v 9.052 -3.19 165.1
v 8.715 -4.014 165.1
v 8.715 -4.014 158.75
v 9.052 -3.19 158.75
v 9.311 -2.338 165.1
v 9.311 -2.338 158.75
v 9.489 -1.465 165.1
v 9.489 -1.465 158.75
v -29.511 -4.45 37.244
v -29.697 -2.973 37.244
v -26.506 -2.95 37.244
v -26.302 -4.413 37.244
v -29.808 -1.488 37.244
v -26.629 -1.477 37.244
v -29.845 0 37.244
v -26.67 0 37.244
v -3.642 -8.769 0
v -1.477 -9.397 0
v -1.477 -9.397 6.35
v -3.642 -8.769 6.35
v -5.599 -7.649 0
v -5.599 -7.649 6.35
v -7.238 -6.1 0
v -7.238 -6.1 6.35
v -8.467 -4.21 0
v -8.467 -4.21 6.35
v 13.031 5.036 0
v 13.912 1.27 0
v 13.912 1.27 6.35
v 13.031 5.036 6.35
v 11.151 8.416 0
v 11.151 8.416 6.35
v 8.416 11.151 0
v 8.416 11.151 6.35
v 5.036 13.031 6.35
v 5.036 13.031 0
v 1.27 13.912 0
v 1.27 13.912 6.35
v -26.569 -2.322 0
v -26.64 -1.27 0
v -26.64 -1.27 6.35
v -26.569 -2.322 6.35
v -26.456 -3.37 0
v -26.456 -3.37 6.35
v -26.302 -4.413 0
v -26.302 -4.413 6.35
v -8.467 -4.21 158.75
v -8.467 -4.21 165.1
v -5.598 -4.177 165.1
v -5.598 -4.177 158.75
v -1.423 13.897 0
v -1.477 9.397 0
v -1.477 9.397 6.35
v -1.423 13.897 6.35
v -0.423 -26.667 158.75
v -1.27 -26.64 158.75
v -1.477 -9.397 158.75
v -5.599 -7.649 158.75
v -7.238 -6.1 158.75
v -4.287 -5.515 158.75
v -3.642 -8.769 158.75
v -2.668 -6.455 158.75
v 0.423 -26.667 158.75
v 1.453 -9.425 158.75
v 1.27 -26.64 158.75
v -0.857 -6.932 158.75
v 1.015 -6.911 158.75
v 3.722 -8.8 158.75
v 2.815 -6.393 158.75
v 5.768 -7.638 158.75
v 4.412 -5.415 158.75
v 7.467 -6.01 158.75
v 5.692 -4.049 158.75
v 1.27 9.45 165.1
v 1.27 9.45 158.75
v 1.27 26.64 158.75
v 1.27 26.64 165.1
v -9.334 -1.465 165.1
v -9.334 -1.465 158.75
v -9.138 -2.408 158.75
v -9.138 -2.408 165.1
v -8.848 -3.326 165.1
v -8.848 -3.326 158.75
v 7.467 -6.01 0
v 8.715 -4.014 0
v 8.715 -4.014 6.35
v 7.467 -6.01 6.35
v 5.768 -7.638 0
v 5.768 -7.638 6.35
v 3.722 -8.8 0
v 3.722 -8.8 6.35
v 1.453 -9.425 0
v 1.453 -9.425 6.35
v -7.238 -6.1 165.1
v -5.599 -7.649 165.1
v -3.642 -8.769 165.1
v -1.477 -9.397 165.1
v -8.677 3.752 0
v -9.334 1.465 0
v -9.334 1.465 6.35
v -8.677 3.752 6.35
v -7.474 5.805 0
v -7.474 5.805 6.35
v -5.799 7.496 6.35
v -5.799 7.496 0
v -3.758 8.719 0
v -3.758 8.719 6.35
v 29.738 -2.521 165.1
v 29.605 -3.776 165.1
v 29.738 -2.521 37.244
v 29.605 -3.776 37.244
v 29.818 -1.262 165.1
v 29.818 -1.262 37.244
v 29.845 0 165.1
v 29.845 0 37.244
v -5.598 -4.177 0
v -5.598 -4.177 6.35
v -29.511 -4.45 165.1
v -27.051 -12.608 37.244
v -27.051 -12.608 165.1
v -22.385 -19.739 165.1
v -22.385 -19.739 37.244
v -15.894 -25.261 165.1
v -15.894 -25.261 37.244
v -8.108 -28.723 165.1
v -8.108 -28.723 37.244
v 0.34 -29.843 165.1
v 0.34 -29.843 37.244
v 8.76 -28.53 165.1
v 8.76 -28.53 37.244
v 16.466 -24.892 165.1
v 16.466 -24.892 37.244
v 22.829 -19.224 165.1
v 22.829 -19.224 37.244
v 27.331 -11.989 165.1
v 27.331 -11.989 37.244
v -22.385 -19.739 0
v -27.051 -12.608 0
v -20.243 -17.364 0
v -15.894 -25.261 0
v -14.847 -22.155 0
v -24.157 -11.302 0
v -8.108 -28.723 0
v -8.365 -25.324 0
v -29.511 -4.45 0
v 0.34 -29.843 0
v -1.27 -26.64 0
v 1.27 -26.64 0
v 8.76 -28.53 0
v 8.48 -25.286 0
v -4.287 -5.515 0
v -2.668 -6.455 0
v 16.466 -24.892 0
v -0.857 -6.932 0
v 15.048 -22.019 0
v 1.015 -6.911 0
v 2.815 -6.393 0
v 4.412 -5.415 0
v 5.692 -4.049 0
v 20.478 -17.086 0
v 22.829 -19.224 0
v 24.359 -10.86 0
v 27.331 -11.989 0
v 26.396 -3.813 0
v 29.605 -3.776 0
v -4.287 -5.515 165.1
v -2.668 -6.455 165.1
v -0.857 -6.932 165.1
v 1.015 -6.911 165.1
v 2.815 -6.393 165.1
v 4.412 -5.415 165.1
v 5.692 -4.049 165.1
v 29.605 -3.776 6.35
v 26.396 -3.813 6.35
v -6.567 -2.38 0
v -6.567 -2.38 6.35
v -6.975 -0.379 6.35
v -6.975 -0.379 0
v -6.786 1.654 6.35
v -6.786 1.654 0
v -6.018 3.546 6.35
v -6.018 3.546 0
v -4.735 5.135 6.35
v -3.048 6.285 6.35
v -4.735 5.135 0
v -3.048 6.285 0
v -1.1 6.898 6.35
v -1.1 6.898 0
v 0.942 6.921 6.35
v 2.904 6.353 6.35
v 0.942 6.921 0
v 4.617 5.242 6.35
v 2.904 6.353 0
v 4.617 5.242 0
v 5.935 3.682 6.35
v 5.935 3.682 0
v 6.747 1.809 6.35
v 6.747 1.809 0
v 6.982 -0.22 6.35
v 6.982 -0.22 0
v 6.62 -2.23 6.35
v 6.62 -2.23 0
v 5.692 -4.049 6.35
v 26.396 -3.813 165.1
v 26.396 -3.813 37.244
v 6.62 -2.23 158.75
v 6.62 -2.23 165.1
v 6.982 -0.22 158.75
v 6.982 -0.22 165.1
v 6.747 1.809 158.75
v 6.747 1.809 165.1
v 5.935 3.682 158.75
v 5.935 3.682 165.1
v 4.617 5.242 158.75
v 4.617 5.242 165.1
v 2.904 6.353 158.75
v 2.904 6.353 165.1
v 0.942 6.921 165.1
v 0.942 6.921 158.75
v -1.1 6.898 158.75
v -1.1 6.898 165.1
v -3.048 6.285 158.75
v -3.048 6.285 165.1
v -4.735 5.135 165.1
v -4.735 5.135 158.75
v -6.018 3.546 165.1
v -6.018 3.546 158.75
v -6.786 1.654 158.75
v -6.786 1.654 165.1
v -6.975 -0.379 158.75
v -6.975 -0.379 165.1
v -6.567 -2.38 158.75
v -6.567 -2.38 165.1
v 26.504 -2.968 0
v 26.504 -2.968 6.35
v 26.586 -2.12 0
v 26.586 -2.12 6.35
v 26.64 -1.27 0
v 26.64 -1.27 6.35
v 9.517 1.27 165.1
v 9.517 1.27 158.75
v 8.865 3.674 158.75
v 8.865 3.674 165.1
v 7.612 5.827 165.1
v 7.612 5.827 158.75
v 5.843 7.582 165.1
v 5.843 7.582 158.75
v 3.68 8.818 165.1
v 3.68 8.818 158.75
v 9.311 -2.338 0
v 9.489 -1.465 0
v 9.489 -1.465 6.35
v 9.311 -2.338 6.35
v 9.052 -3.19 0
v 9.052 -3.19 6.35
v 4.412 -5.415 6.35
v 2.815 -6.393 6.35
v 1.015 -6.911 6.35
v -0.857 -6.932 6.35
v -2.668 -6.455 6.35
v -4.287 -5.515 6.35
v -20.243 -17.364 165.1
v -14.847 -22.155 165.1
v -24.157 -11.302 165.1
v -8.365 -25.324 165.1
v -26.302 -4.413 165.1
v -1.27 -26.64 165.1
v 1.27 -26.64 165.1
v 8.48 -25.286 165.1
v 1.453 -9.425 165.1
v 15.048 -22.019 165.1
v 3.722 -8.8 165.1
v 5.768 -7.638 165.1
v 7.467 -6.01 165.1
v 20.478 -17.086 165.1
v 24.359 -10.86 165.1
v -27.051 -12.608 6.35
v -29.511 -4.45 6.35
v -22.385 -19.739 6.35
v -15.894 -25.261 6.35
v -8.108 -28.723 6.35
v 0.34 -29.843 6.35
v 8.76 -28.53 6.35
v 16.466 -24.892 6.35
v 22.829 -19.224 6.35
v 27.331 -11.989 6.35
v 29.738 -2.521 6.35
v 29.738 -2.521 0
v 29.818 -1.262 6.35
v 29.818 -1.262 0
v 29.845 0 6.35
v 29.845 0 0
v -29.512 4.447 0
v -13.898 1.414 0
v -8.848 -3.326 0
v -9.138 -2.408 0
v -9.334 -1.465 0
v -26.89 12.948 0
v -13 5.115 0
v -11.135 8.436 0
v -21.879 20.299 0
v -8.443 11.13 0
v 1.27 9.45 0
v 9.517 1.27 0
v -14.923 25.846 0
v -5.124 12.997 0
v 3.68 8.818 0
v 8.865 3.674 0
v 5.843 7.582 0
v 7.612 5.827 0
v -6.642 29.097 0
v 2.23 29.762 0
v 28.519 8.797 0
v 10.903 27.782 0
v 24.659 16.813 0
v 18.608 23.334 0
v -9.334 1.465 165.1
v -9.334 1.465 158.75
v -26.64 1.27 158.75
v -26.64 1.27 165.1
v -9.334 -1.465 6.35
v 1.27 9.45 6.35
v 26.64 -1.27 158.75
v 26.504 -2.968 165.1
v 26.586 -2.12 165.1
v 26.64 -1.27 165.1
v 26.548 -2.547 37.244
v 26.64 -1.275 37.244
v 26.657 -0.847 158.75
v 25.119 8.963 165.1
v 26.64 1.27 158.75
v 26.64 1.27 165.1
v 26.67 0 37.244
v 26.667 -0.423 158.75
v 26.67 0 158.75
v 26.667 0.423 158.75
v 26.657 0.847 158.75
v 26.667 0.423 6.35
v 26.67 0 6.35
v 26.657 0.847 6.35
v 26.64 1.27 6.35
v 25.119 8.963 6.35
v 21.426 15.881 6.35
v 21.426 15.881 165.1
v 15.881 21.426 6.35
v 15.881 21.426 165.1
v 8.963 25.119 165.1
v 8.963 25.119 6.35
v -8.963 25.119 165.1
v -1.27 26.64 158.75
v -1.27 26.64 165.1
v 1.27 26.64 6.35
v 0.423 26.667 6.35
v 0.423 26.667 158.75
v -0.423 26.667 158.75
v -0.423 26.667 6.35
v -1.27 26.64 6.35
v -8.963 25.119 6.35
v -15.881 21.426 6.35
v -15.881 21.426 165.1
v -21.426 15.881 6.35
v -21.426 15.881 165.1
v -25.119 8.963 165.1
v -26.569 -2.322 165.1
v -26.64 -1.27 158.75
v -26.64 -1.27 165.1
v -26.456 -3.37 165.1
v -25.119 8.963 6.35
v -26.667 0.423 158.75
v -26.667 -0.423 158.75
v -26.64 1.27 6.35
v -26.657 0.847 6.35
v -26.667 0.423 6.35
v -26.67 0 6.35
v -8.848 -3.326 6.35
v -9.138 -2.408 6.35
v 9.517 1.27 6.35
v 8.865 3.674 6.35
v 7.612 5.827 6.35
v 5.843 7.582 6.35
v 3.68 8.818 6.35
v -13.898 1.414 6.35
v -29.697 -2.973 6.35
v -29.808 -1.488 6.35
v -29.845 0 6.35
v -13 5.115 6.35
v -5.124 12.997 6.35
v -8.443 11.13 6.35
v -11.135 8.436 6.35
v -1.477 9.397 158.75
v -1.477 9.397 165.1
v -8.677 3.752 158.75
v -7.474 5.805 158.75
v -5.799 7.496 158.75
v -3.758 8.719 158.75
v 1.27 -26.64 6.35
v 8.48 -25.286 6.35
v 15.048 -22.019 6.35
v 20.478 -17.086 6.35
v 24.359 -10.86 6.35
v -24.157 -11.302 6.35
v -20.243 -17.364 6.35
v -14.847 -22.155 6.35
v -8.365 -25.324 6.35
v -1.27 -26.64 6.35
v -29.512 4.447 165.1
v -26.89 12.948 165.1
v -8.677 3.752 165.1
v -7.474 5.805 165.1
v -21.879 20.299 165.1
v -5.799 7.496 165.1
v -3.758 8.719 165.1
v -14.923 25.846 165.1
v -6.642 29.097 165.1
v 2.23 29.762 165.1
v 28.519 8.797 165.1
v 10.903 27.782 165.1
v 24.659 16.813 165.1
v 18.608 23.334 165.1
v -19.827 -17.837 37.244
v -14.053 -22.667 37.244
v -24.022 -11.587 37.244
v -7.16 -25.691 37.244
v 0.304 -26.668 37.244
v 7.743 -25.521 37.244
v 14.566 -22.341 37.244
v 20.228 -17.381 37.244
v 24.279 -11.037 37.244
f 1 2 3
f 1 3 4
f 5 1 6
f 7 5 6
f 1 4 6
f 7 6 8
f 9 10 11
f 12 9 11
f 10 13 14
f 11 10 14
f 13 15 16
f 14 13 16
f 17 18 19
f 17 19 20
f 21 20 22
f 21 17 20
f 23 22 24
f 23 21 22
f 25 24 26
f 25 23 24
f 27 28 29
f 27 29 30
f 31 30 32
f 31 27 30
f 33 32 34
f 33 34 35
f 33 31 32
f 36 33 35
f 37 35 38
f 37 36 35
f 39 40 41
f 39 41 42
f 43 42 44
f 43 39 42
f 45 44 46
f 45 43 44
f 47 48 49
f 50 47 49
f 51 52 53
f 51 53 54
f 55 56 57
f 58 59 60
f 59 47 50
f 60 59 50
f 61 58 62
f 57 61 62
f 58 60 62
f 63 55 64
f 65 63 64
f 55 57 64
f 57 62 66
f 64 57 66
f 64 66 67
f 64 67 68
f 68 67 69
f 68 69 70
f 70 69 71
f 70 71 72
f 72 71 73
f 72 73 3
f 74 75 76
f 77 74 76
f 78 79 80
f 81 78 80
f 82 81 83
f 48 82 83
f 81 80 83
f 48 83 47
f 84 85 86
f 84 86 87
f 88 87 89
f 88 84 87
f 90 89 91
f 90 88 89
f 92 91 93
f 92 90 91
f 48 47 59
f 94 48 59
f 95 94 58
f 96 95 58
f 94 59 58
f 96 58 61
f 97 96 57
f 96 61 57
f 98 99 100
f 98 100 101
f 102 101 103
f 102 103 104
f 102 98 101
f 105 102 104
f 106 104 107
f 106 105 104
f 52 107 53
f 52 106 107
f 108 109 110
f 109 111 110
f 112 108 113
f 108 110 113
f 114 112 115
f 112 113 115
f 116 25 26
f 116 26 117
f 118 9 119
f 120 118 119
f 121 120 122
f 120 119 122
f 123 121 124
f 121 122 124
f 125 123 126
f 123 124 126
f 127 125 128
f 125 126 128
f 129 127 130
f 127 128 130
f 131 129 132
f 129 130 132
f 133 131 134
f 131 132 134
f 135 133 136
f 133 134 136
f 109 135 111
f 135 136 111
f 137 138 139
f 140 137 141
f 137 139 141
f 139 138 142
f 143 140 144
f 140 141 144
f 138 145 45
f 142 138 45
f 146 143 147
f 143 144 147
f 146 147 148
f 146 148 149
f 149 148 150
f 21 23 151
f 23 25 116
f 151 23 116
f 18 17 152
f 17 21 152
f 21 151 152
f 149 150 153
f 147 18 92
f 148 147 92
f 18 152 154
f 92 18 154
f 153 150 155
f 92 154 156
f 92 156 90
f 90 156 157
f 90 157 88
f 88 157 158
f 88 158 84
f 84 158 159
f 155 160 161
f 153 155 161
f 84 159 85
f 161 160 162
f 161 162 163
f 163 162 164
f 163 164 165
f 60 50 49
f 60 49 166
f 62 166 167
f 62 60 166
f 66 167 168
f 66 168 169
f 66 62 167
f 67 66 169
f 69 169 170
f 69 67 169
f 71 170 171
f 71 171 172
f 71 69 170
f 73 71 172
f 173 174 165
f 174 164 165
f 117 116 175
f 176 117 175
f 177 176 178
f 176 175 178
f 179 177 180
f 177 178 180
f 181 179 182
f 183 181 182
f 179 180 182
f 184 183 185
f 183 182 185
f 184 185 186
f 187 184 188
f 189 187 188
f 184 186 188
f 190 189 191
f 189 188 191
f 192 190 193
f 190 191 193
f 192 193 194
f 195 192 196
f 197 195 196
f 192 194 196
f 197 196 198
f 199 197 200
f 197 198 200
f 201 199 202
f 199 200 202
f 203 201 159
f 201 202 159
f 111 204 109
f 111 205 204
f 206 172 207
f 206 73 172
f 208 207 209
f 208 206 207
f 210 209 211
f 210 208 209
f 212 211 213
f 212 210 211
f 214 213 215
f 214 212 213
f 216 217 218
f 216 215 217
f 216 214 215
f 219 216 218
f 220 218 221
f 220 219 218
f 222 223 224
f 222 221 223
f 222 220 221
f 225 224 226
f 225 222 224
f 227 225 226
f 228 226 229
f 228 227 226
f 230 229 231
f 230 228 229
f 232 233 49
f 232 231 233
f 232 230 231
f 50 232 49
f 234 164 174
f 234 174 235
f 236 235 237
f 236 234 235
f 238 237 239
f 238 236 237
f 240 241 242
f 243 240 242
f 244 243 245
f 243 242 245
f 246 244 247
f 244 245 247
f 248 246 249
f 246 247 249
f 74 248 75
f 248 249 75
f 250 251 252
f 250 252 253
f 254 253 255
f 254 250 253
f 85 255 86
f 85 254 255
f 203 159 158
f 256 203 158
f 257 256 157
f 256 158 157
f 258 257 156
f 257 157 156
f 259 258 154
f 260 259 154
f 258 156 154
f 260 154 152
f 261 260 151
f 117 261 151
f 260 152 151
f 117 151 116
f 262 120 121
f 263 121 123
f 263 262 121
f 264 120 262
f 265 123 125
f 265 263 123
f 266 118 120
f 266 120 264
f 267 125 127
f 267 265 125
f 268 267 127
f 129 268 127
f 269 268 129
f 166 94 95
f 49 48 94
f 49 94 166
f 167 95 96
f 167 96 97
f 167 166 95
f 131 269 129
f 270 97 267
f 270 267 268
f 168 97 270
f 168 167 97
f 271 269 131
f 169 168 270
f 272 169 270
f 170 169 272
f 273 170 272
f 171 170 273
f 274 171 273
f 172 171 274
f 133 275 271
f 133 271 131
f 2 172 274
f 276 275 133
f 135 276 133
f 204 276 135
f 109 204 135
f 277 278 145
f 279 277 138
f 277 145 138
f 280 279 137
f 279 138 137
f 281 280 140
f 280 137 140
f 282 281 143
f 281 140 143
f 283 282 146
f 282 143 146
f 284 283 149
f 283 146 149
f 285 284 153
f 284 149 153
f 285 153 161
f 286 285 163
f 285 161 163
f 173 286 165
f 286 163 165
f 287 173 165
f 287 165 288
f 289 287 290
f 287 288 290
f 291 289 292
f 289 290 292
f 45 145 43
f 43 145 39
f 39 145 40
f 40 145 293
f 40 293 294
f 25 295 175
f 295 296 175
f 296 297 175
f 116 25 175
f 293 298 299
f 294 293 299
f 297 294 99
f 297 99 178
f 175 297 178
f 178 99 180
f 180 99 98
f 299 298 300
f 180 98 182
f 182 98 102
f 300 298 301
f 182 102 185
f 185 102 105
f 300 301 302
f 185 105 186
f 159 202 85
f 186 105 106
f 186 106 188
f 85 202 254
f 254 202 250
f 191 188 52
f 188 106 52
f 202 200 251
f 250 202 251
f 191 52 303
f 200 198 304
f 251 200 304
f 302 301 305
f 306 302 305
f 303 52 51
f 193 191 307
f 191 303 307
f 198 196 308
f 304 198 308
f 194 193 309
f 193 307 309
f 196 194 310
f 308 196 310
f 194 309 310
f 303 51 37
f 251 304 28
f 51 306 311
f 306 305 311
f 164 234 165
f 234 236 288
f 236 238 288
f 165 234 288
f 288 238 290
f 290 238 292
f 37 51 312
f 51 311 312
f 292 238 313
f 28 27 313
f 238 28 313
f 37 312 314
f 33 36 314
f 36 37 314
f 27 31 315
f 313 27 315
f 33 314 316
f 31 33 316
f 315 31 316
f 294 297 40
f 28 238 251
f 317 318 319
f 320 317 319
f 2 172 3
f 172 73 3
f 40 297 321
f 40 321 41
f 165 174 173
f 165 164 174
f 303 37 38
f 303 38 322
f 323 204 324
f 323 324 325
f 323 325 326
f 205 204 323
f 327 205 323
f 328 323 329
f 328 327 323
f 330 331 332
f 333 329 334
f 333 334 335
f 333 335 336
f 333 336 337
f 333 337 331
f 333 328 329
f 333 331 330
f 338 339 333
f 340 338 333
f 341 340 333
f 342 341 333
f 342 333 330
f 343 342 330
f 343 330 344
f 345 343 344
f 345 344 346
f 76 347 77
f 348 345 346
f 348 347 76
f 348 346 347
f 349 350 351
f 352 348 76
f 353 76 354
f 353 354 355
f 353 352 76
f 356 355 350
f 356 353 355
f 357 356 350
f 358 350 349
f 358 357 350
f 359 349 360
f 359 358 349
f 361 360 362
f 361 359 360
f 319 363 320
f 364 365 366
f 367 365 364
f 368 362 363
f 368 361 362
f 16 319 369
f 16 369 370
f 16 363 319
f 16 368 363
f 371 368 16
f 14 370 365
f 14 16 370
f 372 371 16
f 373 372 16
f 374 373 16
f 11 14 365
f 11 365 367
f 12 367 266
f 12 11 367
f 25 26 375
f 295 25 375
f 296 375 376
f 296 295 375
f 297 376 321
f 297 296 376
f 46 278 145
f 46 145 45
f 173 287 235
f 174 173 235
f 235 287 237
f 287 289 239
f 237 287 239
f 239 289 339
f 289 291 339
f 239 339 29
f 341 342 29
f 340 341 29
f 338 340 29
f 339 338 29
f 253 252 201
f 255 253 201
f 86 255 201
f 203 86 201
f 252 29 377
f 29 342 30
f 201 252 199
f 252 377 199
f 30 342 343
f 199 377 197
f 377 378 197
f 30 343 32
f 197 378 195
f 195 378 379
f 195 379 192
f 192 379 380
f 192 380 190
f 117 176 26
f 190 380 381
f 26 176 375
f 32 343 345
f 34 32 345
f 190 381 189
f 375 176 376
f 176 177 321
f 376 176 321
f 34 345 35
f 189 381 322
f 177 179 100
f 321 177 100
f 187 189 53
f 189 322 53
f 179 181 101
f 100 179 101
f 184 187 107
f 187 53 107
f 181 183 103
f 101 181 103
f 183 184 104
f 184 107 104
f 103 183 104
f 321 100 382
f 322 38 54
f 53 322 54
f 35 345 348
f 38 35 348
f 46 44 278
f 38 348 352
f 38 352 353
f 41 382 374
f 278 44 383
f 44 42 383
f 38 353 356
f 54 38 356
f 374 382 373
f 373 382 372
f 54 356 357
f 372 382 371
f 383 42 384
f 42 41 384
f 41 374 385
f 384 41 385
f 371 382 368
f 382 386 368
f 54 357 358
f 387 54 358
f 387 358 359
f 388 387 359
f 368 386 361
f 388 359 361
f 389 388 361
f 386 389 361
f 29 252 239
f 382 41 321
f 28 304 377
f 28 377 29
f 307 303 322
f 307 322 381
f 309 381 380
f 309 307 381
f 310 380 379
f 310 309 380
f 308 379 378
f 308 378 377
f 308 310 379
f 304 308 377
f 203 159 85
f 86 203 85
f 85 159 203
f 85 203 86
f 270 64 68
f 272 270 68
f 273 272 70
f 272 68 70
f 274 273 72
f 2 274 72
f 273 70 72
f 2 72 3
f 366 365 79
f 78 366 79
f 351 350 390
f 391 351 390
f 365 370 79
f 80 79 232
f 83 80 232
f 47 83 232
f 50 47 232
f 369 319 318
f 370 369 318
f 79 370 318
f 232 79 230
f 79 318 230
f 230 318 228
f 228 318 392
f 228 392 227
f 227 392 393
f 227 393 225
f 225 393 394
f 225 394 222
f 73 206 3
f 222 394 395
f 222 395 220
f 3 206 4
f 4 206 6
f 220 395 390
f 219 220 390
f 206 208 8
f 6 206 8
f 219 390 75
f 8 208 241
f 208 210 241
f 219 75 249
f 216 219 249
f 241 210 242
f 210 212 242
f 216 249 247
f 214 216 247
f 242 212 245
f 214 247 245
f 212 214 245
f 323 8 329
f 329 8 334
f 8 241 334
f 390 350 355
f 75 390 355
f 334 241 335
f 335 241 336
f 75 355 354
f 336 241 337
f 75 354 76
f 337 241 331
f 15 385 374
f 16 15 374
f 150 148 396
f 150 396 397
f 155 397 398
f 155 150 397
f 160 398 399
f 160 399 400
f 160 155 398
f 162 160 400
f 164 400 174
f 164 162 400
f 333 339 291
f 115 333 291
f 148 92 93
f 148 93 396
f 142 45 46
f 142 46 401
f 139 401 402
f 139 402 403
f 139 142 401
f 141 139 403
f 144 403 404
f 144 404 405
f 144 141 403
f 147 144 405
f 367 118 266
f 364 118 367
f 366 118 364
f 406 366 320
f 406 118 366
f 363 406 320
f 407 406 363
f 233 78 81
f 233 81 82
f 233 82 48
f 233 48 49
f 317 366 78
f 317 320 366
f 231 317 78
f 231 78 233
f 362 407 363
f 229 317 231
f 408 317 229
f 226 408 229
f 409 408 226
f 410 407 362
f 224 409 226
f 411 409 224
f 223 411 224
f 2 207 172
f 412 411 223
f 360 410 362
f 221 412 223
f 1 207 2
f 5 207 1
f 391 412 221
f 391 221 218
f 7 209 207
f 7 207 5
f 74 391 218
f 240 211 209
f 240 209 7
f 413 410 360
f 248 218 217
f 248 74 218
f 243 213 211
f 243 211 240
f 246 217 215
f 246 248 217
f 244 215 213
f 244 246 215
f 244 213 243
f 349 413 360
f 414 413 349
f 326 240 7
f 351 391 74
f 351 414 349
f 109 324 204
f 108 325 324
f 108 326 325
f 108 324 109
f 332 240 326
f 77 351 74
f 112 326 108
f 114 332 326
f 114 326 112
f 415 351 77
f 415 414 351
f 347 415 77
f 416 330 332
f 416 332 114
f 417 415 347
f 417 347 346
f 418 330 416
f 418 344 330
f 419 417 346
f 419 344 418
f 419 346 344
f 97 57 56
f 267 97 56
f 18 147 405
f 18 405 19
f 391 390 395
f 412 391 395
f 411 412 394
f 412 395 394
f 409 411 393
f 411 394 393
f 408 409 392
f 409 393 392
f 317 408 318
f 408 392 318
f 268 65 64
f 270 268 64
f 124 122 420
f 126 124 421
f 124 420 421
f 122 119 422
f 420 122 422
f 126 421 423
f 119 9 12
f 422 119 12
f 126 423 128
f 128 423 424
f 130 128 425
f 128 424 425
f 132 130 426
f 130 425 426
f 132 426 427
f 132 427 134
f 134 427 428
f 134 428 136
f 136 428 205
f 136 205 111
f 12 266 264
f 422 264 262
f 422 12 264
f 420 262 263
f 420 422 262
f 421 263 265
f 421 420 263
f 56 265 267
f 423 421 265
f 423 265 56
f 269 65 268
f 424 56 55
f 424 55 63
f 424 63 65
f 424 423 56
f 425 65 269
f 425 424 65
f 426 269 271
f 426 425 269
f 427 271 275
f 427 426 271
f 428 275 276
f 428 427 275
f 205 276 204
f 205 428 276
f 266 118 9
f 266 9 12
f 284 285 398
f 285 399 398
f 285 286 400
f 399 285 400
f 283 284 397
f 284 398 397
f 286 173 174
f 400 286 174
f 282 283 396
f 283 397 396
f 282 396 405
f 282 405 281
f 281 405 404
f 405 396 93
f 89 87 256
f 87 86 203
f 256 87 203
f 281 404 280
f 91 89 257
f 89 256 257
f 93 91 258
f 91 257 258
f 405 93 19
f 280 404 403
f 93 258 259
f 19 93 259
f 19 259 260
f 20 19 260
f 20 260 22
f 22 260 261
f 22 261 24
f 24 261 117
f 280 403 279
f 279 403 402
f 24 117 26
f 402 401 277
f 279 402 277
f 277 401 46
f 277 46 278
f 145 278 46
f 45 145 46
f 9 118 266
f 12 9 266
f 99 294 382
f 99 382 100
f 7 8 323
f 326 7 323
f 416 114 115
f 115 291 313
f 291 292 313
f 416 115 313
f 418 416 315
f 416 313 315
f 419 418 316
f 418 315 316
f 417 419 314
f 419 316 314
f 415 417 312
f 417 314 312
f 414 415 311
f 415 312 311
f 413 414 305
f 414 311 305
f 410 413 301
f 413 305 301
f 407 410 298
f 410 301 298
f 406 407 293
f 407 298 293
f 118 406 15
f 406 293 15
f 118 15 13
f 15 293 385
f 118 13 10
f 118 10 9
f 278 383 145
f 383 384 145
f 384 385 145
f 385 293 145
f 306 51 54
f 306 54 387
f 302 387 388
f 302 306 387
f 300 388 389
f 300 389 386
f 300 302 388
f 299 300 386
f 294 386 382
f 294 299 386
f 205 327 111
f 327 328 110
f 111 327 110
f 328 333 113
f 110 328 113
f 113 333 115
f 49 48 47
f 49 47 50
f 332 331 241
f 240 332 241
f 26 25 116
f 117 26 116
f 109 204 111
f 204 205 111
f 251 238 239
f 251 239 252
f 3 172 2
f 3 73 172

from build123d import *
from build123d.topology import SkipClean

# Parameters (mm, degrees)
SKETCH1_R           = 29.845
SKETCH1_R_2         = 26.67
BOSS_EXTRUDE1_DEPTH = 165.1
SKETCH2_W           = 59.69
SKETCH2_H           = 38.1
CUT_EXTRUDE1_DEPTH  = 171.409677102
BOSS_EXTRUDE2_DEPTH = 6.35
SKETCH5_R           = 6.985
BOSS_EXTRUDE4_DEPTH = 6.35
BOSS_EXTRUDE5_START = -6.35
SKETCH4_R           = 29.845
SKETCH4_R_2         = 26.67
SKETCH4_R_3         = 6.985
BOSS_EXTRUDE5_DEPTH = 6.35


with BuildPart() as part:
    # Sketch1 → Boss-Extrude1 (new body)
    with BuildSketch(Plane.XY):
        Circle(SKETCH1_R)
        Circle(SKETCH1_R_2, mode=Mode.SUBTRACT)
    extrude(amount=BOSS_EXTRUDE1_DEPTH)

    # Sketch2 → Cut-Extrude1 (cut, through all)
    with BuildSketch(Plane(origin=(0, 0, 0), x_dir=(1, 0, 0), z_dir=(0, 1, 0))):
        with Locations((0, -18.194460122)):
            Rectangle(SKETCH2_W, SKETCH2_H)
    extrude(amount=-CUT_EXTRUDE1_DEPTH, mode=Mode.SUBTRACT)

    # Sketch3 → Boss-Extrude2 (add)
    with BuildSketch(Plane(origin=(0, 0, 0), x_dir=(-1, 0, 0), z_dir=(0, 0, -1))):
        with BuildLine():
            Line((-29.845, 0), (-13.97, 0))
            ThreePointArc((-13.97, 0), (0, 13.97), (13.97, 0))
            Line((13.97, 0), (29.845, 0))
            ThreePointArc((29.845, 0), (0, 29.845), (-29.845, 0))
        make_face()
    extrude(amount=-BOSS_EXTRUDE2_DEPTH)

    # Sketch5 → Boss-Extrude4 (add)
    # profile 1 of 2: a face of its own
    with SkipClean():  # the faces are left unmerged after this step: merging them gives an invalid solid
        with BuildSketch(Plane(origin=(0, 0, 0), x_dir=(-1, 0, 0), z_dir=(0, 0, -1))):
            with BuildLine():
                Line((26.639744744, 1.27), (13.898270164, 1.413855169))
                ThreePointArc((13.898270164, 1.413855169), (13.952056017, 0.707836776), (13.97, 0))
                Line((13.97, 0), (29.845, 0))
                ThreePointArc((29.845, 0), (0.635143844, 29.838240855), (-29.81796648, 1.27))
                ThreePointArc((-29.81796648, 1.27), (-29.838240855, 0.635143844), (-29.845, 0))
                Line((-29.845, 0), (-13.97, 0))
                ThreePointArc((-13.97, 0), (-13.955530747, 0.635658375), (-13.912152961, 1.27))
                Line((-13.912152961, 1.27), (-26.639744744, 1.27))
                ThreePointArc((-26.639744744, 1.27), (-18.858537854, 18.858537854), (-1.27, 26.639744744))
                Line((-1.27, 26.639744744), (-1.27, 13.912152961))
                ThreePointArc((-1.27, 13.912152961), (0.07695289, 13.969788053), (1.423189091, 13.897317468))
                Line((1.423189091, 13.897317468), (1.27, 26.639744744))
                ThreePointArc((1.27, 26.639744744), (18.858537854, 18.858537854), (26.639744744, 1.27))
            make_face()
        # profile 2 of 2: a face of its own
        with BuildSketch(Plane(origin=(0, 0, 0), x_dir=(-1, 0, 0), z_dir=(0, 0, -1))):
            with BuildLine():
                Line((13.898270164, 1.413855169), (9.33422749, 1.465384615))
                ThreePointArc((9.33422749, 1.465384615), (6.689709997, 6.703146826), (1.477288556, 9.397267918))
                Line((1.477288556, 9.397267918), (1.423189091, 13.897317468))
                ThreePointArc((1.423189091, 13.897317468), (0.07695289, 13.969788053), (-1.27, 13.912152961))
                Line((-1.27, 13.912152961), (-1.27, 9.45004085))
                ThreePointArc((-1.27, 9.45004085), (-6.784923303, 6.762723487), (-9.517329266, 1.27))
                Line((-9.517329266, 1.27), (-13.912152961, 1.27))
                ThreePointArc((-13.912152961, 1.27), (-13.955530747, 0.635658375), (-13.97, 0))
                Line((-13.97, 0), (-29.845, 0))
                ThreePointArc((-29.845, 0), (0, -29.845), (29.845, 0))
                Line((29.845, 0), (13.97, 0))
                ThreePointArc((13.97, 0), (13.952056017, 0.707836776), (13.898270164, 1.413855169))
            make_face()
            with BuildLine():
                Line((-26.639744744, -1.27), (-9.488978712, -1.465384615))
                ThreePointArc((-9.488978712, -1.465384615), (-6.780569847, -6.767038646), (-1.453480675, -9.425070814))
                Line((-1.453480675, -9.425070814), (-1.27, -26.639744744))
                ThreePointArc((-1.27, -26.639744744), (-18.858537854, -18.858537854), (-26.639744744, -1.27))
            make_face(mode=Mode.SUBTRACT)
            with BuildLine():
                Line((9.33422749, -1.465384615), (26.639744744, -1.27))
                ThreePointArc((26.639744744, -1.27), (18.858537854, -18.858537854), (1.27, -26.639744744))
                Line((1.27, -26.639744744), (1.477288556, -9.397267918))
                ThreePointArc((1.477288556, -9.397267918), (6.689709997, -6.703146826), (9.33422749, -1.465384615))
            make_face(mode=Mode.SUBTRACT)
            Circle(SKETCH5_R, mode=Mode.SUBTRACT)
        extrude(amount=-BOSS_EXTRUDE4_DEPTH)

    # Sketch4 → Boss-Extrude5 (add)
    # profile 1 of 2: a face of its own
    with SkipClean():  # the faces are left unmerged after this step: merging them gives an invalid solid
        with BuildSketch(Plane.XY.offset(165.1).offset(BOSS_EXTRUDE5_START)):
            Circle(SKETCH4_R)
            with Locations(Location((0, 0, 0), (0, 0, 180))):
                Circle(SKETCH4_R_2, mode=Mode.SUBTRACT)
        # profile 2 of 2: a face of its own
        with BuildSketch(Plane.XY.offset(165.1).offset(BOSS_EXTRUDE5_START)):
            with BuildLine():
                Line((1.27, 9.45004085), (1.27, 26.639744744))
                ThreePointArc((1.27, 26.639744744), (0, 26.67), (-1.27, 26.639744744))
                Line((-1.27, 26.639744744), (-1.477288556, 9.397267918))
                ThreePointArc((-1.477288556, 9.397267918), (-6.689709997, 6.703146826), (-9.33422749, 1.465384615))
                Line((-9.33422749, 1.465384615), (-26.639744744, 1.27))
                ThreePointArc((-26.639744744, 1.27), (-26.67, 0), (-26.639744744, -1.27))
                Line((-26.639744744, -1.27), (-9.33422749, -1.465384615))
                ThreePointArc((-9.33422749, -1.465384615), (-6.689709997, -6.703146826), (-1.477288556, -9.397267918))
                Line((-1.477288556, -9.397267918), (-1.27, -26.639744744))
                ThreePointArc((-1.27, -26.639744744), (0, -26.67), (1.27, -26.639744744))
                Line((1.27, -26.639744744), (1.453480675, -9.425070814))
                ThreePointArc((1.453480675, -9.425070814), (6.780569847, -6.767038646), (9.488978712, -1.465384615))
                Line((9.488978712, -1.465384615), (26.639744744, -1.27))
                ThreePointArc((26.639744744, -1.27), (26.662435113, -0.635180167), (26.67, 0))
                ThreePointArc((26.67, 0), (26.662435113, 0.635180167), (26.639744744, 1.27))
                Line((26.639744744, 1.27), (9.517329266, 1.27))
                ThreePointArc((9.517329266, 1.27), (6.784923303, 6.762723487), (1.27, 9.45004085))
            make_face()
            with Locations(Location((0, 0, 0), (0, 0, 180))):
                Circle(SKETCH4_R_3, mode=Mode.SUBTRACT)
        extrude(amount=BOSS_EXTRUDE5_DEPTH)


with BuildPart() as body_2:
    # Split4: the piece on the far side of the plane
    add(part.part)
    split(bisect_by=Plane(origin=(0.046857356, -4.11311578, 0), x_dir=(0.9999351154319066, 0.011391440917629184, 0), z_dir=(-0.011391440917629184, 0.9999351154319066, 0)), keep=Keep.BOTTOM)


with BuildPart() as part_1:
    add(part.part)

    # Split4
    split(bisect_by=Plane(origin=(0.046857356, -4.11311578, 0), x_dir=(0.9999351154319066, 0.011391440917629184, 0), z_dir=(-0.011391440917629184, 0.9999351154319066, 0)), keep=Keep.TOP)


solid = Compound([body_2.part, part_1.part])
